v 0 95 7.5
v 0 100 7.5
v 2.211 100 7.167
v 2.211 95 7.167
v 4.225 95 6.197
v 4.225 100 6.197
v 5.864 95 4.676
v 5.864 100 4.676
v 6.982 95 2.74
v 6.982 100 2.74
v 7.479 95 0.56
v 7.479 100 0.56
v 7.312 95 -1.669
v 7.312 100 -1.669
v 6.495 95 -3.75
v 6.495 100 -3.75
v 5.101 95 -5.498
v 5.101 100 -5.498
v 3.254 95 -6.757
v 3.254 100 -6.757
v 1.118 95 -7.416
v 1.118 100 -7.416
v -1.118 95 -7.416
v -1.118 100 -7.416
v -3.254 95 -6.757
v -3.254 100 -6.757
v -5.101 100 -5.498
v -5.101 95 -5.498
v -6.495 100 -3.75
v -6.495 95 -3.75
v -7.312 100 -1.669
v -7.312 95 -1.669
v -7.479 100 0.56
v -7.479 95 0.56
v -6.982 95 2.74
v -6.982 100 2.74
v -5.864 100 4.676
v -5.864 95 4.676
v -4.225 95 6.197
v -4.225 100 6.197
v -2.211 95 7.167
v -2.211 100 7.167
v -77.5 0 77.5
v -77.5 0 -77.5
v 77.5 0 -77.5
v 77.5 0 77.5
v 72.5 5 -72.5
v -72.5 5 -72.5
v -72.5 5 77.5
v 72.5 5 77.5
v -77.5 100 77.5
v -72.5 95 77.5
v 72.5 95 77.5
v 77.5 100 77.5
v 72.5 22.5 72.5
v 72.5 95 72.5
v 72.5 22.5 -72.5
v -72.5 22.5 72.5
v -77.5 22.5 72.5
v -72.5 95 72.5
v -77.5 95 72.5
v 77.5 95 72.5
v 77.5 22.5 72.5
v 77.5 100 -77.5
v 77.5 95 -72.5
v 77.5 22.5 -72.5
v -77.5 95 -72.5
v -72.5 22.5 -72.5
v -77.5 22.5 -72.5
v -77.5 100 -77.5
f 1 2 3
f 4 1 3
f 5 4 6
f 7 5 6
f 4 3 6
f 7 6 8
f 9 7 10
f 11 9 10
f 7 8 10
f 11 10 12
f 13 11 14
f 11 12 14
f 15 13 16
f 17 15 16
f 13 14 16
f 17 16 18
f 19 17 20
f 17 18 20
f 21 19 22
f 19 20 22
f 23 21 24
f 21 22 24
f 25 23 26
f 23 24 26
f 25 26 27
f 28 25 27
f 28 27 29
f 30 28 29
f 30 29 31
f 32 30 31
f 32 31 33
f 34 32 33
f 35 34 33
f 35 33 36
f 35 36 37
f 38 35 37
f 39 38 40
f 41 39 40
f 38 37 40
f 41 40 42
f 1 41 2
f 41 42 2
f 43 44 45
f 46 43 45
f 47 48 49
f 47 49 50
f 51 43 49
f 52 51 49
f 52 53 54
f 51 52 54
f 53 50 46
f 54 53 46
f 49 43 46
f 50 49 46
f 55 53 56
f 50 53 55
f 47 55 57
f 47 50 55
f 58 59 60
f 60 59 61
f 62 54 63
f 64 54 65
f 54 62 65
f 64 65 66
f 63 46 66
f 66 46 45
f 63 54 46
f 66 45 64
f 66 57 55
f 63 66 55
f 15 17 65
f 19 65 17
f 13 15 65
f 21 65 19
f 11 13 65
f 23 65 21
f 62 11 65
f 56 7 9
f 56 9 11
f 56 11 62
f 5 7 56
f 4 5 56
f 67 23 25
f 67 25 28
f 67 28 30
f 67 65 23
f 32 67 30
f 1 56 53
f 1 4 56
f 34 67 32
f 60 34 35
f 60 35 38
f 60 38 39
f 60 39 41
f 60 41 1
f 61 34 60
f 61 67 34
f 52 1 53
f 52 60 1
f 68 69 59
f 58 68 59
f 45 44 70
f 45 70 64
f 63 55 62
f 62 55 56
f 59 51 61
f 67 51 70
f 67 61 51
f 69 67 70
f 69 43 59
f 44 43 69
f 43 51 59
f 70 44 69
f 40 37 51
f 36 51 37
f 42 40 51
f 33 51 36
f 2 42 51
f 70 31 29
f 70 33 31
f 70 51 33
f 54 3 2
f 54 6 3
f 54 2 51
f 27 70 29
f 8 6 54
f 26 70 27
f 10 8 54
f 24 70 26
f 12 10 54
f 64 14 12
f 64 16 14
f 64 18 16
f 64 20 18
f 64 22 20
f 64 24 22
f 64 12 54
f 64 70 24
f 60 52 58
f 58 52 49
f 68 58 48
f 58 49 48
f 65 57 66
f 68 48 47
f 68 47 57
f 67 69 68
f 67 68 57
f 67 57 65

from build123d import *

# Parameters (mm, degrees)
SKETCH1_W           = 155
SKETCH1_H           = 155
BOSS_EXTRUDE1_DEPTH = 100
SHELL1_T            = -5
SKETCH2_R           = 7.5
CUT_EXTRUDE1_DEPTH  = 5
CUT_EXTRUDE2_REACH  = 202.078
SKETCH5_W           = 145
SKETCH5_H           = 72.5


with BuildPart() as part:
    # Sketch1 → Boss-Extrude1 (new body)
    with BuildSketch(Plane(origin=(0, 0, 0), x_dir=(1, 0, 0), z_dir=(0, 1, 0))):
        Rectangle(SKETCH1_W, SKETCH1_H)
    extrude(amount=BOSS_EXTRUDE1_DEPTH)

    # Shell1
    shell1_openings = [part.faces().sort_by_distance(p)[0] for p in [
        (0, 50, 77.5),
    ]]
    offset(amount=SHELL1_T, openings=shell1_openings, kind=Kind.INTERSECTION)

    # Sketch2 → Cut-Extrude1 (cut)
    with BuildSketch(Plane(origin=(0, 100, 0), x_dir=(1, 0, 0), z_dir=(0, 1, 0))):
        with Locations(Location((0, 0, 0), (0, 0, 270))):
            Circle(SKETCH2_R)
    extrude(amount=-CUT_EXTRUDE1_DEPTH, mode=Mode.SUBTRACT)

    # Cut-Extrude2: up to this face of the body (flat: up to its plane)
    cut_extrude2_end = Plane(part.part.faces().sort_by_distance((77.5, 50, 0))[0])
    # Sketch5 → Cut-Extrude2 (cut, up to the picked face)
    with BuildSketch(Plane.ZY.offset(77.5), mode=Mode.PRIVATE) as cut_extrude2_sk1:
        with Locations((0, 58.75)):
            Rectangle(SKETCH5_W, SKETCH5_H)
    cut_extrude2_tool1 = split(extrude(cut_extrude2_sk1.sketch, amount=-CUT_EXTRUDE2_REACH, mode=Mode.PRIVATE), bisect_by=cut_extrude2_end, keep=Keep.BOTH, mode=Mode.PRIVATE)
    add(cut_extrude2_tool1.solids().sort_by(Axis((-77.5, 58.75, 0), (1, 0, 0)))[0], mode=Mode.SUBTRACT)


solid = part.part
